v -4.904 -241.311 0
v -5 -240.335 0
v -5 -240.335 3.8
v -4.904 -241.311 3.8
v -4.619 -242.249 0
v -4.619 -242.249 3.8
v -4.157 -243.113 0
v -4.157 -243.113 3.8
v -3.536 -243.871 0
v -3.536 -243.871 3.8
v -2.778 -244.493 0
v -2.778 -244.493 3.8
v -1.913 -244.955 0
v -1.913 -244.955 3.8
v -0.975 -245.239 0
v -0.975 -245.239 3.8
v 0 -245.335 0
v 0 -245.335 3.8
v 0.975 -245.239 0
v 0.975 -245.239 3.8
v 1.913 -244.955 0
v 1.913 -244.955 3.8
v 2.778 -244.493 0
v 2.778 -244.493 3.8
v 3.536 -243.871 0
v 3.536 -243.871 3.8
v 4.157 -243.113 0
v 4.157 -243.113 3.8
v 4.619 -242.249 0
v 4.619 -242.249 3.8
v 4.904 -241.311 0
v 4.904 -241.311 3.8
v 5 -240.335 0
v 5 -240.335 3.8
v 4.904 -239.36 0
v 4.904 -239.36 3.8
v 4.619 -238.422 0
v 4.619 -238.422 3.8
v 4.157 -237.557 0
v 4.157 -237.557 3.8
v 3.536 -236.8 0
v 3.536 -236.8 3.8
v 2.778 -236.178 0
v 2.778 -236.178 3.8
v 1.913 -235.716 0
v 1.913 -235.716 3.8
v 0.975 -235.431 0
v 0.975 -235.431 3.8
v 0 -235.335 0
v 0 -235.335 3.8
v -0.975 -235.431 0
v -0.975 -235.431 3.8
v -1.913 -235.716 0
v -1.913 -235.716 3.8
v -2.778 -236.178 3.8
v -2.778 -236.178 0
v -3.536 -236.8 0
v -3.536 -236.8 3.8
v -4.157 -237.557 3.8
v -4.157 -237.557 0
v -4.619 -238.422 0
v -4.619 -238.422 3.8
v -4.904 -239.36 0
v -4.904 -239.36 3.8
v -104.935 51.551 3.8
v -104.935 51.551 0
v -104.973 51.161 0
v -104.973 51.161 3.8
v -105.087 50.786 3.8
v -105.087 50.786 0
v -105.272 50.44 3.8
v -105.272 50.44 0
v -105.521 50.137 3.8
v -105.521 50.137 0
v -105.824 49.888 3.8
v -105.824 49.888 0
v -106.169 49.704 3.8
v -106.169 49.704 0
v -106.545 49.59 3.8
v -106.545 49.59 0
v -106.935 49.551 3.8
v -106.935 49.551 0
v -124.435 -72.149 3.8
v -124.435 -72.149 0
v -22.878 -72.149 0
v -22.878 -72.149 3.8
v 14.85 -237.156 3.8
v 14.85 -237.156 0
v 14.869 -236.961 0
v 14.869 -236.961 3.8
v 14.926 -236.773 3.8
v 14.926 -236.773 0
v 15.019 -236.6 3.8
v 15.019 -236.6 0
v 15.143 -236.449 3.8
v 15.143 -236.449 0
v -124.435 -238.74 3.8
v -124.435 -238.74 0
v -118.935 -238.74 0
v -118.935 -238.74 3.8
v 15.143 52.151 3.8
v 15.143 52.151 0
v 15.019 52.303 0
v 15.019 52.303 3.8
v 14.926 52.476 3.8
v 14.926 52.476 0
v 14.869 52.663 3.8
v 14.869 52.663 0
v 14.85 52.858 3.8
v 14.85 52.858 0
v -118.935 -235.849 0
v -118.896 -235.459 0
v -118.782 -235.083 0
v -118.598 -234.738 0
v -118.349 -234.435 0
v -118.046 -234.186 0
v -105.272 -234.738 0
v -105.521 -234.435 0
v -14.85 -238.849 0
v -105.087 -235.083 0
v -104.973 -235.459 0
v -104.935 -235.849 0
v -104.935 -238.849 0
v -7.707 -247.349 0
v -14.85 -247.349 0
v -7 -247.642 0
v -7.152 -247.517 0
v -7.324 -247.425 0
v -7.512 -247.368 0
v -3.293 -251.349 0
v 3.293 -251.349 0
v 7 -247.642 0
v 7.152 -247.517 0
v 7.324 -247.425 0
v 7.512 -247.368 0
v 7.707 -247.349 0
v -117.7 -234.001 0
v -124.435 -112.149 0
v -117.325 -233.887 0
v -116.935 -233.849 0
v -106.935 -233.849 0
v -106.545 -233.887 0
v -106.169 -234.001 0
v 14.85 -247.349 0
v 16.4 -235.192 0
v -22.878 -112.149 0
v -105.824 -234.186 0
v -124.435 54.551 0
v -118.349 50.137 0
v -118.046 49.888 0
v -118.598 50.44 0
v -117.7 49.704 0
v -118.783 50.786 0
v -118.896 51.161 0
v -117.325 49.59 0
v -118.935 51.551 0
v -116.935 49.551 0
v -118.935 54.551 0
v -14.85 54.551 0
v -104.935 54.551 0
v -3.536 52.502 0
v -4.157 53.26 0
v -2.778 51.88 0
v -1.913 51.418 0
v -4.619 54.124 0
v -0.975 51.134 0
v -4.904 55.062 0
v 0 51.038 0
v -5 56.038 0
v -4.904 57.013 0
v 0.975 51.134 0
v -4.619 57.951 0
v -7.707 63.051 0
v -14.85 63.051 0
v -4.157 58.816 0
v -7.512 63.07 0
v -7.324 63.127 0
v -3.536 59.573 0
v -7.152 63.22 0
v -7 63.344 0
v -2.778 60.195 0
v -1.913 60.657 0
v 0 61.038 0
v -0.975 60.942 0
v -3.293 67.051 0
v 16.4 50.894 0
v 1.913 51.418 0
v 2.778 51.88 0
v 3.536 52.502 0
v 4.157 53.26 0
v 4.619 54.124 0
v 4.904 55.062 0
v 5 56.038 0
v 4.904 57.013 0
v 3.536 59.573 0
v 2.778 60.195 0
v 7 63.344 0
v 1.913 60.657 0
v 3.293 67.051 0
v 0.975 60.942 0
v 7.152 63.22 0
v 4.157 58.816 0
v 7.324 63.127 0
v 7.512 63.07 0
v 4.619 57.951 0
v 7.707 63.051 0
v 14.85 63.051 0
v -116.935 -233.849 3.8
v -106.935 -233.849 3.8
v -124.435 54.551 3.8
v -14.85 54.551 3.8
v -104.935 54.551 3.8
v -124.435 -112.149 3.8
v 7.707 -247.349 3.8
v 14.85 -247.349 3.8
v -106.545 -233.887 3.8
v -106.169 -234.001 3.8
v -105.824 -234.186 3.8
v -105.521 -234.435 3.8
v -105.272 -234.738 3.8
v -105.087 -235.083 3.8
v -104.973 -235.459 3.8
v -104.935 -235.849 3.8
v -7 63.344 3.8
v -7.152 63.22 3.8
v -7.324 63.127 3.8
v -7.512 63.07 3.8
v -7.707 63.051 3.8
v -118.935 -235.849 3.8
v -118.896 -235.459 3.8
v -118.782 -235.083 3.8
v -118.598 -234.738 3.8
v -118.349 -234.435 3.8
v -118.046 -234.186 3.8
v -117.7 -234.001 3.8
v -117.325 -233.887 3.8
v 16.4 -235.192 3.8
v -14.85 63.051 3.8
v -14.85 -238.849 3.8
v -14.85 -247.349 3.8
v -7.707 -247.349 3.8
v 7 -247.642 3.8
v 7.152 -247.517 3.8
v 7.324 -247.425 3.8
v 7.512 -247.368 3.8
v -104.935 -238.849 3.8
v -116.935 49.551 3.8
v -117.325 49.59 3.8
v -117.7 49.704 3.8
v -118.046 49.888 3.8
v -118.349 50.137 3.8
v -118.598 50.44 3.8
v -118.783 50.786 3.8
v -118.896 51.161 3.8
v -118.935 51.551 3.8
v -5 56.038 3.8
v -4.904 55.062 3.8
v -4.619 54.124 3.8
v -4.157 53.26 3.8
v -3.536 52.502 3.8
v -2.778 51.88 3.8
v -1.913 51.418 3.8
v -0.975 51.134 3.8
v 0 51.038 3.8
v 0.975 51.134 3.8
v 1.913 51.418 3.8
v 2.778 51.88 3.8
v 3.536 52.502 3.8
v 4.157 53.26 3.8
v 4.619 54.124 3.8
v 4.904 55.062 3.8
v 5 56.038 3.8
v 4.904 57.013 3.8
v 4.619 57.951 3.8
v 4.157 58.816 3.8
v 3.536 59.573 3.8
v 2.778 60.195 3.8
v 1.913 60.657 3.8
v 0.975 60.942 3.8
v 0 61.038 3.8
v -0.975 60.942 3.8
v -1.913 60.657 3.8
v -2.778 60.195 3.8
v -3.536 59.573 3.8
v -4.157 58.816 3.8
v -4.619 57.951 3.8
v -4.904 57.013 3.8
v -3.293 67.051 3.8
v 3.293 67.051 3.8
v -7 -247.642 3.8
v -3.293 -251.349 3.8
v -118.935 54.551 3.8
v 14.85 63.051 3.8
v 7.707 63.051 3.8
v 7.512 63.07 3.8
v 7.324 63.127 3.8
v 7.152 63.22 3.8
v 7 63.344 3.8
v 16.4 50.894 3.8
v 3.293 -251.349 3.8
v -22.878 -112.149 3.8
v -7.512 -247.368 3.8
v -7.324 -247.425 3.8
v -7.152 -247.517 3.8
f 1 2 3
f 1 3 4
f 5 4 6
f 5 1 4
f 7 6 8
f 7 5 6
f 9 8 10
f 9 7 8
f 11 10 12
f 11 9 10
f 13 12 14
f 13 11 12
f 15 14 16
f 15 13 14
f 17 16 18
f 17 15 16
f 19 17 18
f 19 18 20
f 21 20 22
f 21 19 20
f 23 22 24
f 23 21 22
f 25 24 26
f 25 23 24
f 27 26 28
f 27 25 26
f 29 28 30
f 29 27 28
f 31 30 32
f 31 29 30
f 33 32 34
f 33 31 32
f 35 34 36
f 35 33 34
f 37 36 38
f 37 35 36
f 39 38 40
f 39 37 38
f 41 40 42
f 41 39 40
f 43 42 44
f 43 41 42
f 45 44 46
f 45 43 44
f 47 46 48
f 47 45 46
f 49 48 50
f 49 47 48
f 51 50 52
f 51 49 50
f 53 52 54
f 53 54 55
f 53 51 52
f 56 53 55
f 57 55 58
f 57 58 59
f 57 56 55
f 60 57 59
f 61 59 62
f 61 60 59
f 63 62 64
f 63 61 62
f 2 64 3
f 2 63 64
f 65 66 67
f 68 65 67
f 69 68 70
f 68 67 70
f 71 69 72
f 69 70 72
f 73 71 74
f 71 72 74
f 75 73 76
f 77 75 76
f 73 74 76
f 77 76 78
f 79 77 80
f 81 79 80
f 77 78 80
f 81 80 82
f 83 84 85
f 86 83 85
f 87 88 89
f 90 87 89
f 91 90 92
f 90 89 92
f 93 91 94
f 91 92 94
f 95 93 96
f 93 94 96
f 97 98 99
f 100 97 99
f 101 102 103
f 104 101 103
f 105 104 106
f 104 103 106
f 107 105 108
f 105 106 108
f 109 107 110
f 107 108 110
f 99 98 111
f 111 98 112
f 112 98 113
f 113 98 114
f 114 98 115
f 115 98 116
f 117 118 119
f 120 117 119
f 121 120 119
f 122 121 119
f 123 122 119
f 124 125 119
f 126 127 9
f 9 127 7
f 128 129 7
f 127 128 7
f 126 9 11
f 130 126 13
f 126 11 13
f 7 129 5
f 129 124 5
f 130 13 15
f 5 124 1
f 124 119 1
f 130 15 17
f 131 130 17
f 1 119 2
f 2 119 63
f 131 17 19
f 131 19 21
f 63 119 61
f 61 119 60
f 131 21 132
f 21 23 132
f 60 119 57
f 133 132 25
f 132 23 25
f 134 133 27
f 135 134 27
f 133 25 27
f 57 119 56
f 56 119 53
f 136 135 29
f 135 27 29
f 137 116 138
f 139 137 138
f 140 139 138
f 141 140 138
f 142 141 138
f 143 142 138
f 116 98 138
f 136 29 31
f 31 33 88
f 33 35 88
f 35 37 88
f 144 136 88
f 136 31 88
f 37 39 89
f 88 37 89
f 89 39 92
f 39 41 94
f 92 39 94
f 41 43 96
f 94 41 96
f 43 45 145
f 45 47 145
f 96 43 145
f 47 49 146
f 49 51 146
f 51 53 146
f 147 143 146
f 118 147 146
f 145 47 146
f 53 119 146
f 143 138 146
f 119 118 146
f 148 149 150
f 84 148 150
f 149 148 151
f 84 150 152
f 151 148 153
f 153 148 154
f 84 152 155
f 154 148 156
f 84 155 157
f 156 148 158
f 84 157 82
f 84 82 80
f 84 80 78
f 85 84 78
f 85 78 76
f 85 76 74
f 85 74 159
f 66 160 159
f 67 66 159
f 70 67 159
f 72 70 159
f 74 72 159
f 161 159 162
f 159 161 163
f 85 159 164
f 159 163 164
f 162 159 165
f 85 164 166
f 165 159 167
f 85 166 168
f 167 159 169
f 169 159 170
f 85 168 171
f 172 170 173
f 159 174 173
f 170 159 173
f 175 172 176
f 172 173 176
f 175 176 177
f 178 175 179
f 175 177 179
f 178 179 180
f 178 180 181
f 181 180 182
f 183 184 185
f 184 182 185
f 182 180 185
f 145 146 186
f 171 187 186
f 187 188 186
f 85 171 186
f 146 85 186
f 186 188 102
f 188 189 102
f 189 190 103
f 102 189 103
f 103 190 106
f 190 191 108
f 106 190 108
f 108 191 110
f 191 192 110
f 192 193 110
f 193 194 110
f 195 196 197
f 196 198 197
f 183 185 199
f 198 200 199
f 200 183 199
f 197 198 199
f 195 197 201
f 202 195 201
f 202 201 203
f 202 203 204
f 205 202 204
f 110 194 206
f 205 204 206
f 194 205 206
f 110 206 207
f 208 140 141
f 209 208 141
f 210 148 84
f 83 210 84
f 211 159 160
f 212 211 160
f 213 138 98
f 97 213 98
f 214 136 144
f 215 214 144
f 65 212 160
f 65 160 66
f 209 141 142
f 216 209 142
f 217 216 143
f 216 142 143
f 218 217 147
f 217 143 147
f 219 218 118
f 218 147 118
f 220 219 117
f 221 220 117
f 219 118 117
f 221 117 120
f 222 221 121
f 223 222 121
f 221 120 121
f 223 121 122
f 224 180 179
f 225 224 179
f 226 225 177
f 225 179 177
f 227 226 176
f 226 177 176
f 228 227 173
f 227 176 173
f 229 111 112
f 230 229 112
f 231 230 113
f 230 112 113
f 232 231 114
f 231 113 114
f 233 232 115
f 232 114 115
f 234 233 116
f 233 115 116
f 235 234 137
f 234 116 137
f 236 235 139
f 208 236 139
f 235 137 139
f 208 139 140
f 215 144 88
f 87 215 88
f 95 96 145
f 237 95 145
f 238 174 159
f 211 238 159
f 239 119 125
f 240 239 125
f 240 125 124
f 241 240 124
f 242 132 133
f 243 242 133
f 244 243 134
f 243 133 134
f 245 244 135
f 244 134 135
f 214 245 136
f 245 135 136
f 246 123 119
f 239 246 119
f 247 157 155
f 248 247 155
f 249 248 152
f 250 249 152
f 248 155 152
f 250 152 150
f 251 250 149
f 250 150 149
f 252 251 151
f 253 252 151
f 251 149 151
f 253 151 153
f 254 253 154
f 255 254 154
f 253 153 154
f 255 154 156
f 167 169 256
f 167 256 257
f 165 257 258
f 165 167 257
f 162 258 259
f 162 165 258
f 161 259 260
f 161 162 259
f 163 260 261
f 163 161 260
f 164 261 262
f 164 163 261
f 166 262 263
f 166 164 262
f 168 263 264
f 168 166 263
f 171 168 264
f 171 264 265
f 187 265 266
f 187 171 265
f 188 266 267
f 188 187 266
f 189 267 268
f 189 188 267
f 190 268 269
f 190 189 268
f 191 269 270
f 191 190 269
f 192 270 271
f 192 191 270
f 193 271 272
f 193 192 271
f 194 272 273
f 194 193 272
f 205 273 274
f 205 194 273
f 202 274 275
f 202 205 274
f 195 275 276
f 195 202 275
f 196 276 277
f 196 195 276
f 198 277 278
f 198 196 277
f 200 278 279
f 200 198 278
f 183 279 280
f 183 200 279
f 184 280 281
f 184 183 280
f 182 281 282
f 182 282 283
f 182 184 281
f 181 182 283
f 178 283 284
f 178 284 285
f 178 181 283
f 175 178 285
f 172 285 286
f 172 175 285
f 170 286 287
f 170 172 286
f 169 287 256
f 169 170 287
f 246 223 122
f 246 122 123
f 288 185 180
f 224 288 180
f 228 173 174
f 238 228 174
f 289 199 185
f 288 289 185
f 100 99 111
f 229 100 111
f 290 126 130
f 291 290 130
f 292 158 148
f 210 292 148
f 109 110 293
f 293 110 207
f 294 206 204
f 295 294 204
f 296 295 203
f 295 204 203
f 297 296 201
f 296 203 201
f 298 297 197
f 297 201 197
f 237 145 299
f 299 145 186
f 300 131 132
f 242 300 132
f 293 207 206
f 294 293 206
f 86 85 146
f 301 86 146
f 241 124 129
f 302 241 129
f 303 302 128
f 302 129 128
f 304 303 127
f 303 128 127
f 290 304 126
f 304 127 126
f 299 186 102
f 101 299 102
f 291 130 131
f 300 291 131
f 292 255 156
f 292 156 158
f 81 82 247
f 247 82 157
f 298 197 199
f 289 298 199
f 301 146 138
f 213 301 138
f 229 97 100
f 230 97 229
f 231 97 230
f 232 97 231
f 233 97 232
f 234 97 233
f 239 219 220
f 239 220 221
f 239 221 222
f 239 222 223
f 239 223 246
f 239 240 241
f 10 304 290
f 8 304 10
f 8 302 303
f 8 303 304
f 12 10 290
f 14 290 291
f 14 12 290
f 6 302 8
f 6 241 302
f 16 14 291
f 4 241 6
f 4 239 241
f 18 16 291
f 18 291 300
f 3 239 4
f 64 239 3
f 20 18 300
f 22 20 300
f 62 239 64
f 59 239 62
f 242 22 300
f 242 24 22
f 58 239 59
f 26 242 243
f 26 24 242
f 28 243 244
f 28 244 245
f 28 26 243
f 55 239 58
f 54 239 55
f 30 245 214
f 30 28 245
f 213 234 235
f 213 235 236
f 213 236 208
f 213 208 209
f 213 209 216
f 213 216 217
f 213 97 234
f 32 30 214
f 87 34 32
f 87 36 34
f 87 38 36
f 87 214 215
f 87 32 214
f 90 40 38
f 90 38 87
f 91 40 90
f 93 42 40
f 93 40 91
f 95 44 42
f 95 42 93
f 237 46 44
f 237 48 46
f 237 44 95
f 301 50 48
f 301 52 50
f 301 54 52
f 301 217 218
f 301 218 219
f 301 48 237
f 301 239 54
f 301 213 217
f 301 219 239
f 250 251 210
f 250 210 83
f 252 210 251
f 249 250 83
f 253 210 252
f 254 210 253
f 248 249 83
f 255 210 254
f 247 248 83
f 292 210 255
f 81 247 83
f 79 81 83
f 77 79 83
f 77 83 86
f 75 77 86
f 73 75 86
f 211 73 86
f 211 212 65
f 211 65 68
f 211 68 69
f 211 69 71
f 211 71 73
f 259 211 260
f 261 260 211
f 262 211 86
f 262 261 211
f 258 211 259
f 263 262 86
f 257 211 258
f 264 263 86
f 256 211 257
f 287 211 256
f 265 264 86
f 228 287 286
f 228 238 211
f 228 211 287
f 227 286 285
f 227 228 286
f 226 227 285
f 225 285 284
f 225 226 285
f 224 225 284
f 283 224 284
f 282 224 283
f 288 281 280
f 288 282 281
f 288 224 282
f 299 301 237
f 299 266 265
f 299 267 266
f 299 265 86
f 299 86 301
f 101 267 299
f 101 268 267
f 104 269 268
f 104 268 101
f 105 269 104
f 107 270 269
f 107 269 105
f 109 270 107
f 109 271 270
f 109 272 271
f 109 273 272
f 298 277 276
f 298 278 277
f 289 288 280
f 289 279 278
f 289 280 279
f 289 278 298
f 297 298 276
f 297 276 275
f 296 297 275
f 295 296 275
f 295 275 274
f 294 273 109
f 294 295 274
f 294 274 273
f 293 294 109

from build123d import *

# Parameters (mm, degrees)
SKETCH1_R           = 5
BOSS_EXTRUDE1_DEPTH = 3.8


with BuildPart() as part:
    # Sketch1 → Boss-Extrude1 (new body)
    with BuildSketch(Plane.XY):
        with BuildLine():
            Line((-124.434769571, -238.739800618), (-118.934676066, -238.739800618))
            Line((-118.934676066, -238.739800618), (-118.934676066, -235.848726439))
            ThreePointArc((-118.934676066, -235.848726439), (-118.348889629, -234.434512877), (-116.934676066, -233.848726439))
            Line((-116.934676066, -233.848726439), (-106.934769571, -233.848726439))
            ThreePointArc((-106.934769571, -233.848726439), (-105.520556009, -234.434512877), (-104.934769571, -235.848726439))
            Line((-104.934769571, -235.848726439), (-104.934769571, -238.848726439))
            Line((-104.934769571, -238.848726439), (-14.85, -238.848726439))
            Line((-14.85, -238.848726439), (-14.85, -247.348726439))
            Line((-14.85, -247.348726439), (-7.707106781, -247.348726439))
            ThreePointArc((-7.707106781, -247.348726439), (-7.324423349, -247.424846907), (-7, -247.641619658))
            Line((-7, -247.641619658), (-3.292893219, -251.348726439))
            Line((-3.292893219, -251.348726439), (3.292893219, -251.348726439))
            Line((3.292893219, -251.348726439), (7, -247.641619658))
            ThreePointArc((7, -247.641619658), (7.324423349, -247.424846907), (7.707106781, -247.348726439))
            Line((7.707106781, -247.348726439), (14.85, -247.348726439))
            Line((14.85, -247.348726439), (14.85, -237.15583322))
            ThreePointArc((14.85, -237.15583322), (14.926120467, -236.773149788), (15.142893219, -236.448726439))
            Line((15.142893219, -236.448726439), (16.4, -235.191619658))
            Line((16.4, -235.191619658), (16.4, 50.89416678))
            Line((16.4, 50.89416678), (15.142893219, 52.151273561))
            ThreePointArc((15.142893219, 52.151273561), (14.926120467, 52.47569691), (14.85, 52.858380342))
            Line((14.85, 52.858380342), (14.85, 63.051273561))
            Line((14.85, 63.051273561), (7.707106781, 63.051273561))
            ThreePointArc((7.707106781, 63.051273561), (7.324423349, 63.127394028), (7, 63.34416678))
            Line((7, 63.34416678), (3.292893219, 67.051273561))
            Line((3.292893219, 67.051273561), (-3.292893219, 67.051273561))
            Line((-3.292893219, 67.051273561), (-7, 63.34416678))
            ThreePointArc((-7, 63.34416678), (-7.324423349, 63.127394028), (-7.707106781, 63.051273561))
            Line((-7.707106781, 63.051273561), (-14.85, 63.051273561))
            Line((-14.85, 63.051273561), (-14.85, 54.551273561))
            Line((-14.85, 54.551273561), (-104.934769571, 54.551273561))
            Line((-104.934769571, 54.551273561), (-104.934769571, 51.551273561))
            ThreePointArc((-104.934769571, 51.551273561), (-105.520556009, 50.137059998), (-106.934769571, 49.551273561))
            Line((-106.934769571, 49.551273561), (-116.934769571, 49.551273561))
            ThreePointArc((-116.934769571, 49.551273561), (-118.348983134, 50.137059998), (-118.934769571, 51.551273561))
            Line((-118.934769571, 51.551273561), (-118.934769571, 54.551273561))
            Line((-118.934769571, 54.551273561), (-124.434769571, 54.551273561))
            Line((-124.434769571, 54.551273561), (-124.434769571, -72.148726439))
            Line((-124.434769571, -72.148726439), (-22.877938229, -72.148726439))
            Line((-22.877938229, -72.148726439), (-22.877938229, -112.148726439))
            Line((-22.877938229, -112.148726439), (-124.434769571, -112.148726439))
            Line((-124.434769571, -112.148726439), (-124.434769571, -238.739800618))
        make_face()
        with Locations(Location((0, -240.335275852, 0), (0, 0, 180))):
            Circle(SKETCH1_R, mode=Mode.SUBTRACT)
        with Locations(Location((0, 56.037822974, 0), (0, 0, 180))):
            Circle(SKETCH1_R, mode=Mode.SUBTRACT)
    extrude(amount=BOSS_EXTRUDE1_DEPTH)


solid = part.part
